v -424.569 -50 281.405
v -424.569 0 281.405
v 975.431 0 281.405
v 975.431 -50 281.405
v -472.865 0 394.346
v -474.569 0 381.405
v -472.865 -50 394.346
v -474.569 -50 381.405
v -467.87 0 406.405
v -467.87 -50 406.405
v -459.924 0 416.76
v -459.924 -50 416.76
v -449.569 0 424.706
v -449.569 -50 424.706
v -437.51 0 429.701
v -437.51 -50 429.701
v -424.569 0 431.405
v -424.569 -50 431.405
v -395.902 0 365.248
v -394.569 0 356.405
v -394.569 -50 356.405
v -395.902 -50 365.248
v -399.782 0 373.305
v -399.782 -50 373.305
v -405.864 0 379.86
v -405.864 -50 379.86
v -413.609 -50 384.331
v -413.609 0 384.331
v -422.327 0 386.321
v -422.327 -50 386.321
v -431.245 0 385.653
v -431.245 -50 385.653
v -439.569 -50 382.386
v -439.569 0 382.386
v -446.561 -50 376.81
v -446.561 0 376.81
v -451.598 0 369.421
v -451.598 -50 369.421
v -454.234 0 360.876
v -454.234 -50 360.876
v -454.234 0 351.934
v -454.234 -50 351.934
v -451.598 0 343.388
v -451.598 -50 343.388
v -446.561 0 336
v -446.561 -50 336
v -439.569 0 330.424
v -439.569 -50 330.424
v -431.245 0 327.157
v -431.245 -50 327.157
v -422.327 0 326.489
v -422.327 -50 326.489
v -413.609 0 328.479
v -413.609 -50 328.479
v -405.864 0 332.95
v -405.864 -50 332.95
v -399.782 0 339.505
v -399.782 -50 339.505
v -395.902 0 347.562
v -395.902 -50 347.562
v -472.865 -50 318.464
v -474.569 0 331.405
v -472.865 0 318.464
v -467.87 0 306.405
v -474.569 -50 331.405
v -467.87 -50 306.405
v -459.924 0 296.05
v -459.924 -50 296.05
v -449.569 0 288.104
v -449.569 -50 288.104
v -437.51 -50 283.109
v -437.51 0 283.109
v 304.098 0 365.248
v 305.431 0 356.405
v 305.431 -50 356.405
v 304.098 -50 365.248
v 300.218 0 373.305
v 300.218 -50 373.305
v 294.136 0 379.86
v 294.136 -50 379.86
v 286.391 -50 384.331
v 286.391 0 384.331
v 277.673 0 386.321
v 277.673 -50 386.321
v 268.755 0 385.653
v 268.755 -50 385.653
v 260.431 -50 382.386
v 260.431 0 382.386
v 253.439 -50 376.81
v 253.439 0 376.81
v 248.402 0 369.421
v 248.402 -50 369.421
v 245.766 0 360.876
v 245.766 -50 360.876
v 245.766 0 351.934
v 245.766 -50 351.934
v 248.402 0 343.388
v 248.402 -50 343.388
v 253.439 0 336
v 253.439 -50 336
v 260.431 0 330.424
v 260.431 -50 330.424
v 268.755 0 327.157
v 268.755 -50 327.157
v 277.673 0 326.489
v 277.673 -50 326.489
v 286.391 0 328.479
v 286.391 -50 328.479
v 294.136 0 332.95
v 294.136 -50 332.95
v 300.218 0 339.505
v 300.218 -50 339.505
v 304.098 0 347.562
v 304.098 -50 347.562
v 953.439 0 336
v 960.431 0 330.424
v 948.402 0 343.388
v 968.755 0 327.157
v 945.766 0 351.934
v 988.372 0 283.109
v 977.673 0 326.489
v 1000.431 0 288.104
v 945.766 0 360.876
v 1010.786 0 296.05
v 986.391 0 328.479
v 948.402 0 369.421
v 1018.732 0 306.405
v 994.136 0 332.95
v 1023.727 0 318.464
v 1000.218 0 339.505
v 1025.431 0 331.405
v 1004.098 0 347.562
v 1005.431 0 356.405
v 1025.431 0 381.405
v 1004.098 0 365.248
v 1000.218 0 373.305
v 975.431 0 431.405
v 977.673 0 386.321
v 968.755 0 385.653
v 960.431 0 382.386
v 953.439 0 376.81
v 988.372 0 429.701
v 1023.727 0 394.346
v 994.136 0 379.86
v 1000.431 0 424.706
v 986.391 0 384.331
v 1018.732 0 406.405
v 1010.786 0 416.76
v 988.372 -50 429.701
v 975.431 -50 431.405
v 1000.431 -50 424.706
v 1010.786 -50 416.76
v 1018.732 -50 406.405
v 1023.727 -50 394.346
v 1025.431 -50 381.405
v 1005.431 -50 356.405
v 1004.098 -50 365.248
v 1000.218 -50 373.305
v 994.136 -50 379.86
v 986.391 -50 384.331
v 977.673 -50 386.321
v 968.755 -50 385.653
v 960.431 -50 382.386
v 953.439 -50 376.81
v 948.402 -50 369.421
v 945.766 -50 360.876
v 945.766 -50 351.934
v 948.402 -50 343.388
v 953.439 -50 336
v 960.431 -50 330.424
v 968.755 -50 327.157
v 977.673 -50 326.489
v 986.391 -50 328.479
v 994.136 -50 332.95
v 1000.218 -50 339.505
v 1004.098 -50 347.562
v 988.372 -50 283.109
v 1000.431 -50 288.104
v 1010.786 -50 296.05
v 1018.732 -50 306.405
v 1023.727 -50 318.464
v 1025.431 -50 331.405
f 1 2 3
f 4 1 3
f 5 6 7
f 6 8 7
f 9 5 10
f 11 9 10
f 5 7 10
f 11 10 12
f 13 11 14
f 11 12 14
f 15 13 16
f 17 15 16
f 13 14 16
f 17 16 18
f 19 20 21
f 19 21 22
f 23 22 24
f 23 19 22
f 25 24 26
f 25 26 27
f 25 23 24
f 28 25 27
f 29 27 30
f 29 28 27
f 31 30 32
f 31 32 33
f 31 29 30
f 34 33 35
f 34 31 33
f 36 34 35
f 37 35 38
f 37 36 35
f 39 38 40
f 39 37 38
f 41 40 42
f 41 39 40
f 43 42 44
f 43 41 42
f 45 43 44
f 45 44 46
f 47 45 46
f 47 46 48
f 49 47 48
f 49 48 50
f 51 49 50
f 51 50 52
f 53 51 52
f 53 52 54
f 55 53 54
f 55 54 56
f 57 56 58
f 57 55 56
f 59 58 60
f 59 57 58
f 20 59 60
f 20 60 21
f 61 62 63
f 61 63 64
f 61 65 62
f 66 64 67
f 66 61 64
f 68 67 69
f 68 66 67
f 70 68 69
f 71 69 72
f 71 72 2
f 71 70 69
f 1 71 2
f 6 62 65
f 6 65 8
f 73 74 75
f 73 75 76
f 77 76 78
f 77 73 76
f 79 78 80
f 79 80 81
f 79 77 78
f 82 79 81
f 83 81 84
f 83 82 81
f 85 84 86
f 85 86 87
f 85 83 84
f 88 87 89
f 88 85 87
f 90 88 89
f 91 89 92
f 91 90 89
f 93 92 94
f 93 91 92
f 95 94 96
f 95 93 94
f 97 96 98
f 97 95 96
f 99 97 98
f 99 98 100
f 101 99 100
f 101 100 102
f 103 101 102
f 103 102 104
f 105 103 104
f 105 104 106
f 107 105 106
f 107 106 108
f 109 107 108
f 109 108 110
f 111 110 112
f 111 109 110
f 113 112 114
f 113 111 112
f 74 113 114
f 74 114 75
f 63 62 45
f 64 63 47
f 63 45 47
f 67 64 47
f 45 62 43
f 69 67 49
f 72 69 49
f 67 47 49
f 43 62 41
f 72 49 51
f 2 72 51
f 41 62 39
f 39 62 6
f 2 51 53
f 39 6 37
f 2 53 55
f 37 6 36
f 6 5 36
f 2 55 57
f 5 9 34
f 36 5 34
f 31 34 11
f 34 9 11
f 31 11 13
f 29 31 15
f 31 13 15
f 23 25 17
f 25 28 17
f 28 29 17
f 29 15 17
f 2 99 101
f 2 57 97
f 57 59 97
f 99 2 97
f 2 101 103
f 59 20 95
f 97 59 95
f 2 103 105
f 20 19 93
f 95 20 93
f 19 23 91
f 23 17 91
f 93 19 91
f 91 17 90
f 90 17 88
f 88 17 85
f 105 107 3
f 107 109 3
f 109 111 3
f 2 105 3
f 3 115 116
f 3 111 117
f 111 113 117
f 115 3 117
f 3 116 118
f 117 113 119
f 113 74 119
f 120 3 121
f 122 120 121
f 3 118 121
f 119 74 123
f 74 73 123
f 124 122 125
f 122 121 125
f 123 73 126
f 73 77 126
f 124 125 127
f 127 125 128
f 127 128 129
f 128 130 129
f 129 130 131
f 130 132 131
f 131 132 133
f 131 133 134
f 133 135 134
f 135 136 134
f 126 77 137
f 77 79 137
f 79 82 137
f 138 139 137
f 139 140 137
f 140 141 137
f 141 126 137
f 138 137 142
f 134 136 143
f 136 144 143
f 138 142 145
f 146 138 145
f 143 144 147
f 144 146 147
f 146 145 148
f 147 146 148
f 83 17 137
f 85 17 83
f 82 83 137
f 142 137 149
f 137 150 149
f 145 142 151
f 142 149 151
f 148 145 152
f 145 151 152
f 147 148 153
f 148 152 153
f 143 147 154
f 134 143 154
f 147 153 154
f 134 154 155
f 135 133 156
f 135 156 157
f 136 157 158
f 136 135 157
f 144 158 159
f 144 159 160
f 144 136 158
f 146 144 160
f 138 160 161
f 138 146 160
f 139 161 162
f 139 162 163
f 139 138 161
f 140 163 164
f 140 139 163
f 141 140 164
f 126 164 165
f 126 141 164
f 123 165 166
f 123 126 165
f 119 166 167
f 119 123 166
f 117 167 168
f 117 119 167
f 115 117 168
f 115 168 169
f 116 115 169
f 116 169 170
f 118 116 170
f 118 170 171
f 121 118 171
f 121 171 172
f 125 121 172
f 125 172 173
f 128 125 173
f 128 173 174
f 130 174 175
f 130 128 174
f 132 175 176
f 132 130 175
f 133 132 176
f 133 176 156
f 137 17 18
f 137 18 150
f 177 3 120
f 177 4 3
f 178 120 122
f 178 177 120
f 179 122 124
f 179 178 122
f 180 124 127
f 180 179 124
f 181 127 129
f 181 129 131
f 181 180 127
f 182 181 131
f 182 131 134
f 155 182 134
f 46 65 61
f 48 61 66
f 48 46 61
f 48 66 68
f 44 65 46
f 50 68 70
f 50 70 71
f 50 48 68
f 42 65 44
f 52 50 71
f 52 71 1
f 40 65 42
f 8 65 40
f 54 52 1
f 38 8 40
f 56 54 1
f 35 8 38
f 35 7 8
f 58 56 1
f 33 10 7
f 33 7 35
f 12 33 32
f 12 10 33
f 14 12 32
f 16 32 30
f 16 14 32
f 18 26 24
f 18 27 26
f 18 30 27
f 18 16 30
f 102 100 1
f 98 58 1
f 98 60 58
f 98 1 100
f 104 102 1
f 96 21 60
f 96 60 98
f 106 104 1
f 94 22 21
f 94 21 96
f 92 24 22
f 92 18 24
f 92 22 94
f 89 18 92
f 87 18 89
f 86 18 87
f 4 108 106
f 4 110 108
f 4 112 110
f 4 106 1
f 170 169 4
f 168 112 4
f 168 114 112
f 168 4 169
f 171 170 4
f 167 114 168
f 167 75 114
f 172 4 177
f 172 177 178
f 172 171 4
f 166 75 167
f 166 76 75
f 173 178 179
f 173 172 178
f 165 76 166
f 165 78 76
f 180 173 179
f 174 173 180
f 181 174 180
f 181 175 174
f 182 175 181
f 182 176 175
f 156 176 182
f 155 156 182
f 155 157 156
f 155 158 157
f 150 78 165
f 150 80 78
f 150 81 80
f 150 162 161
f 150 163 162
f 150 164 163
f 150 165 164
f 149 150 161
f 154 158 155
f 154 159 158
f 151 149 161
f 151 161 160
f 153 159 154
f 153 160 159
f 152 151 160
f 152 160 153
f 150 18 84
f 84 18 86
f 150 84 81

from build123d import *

# Parameters (mm, degrees)
F0_W     = 1500
F0_H     = 150
F0_R     = 30
F1_DEPTH = 50
F2_R     = 50


with BuildPart() as f1:
    # F0 (on Front) → F1 (new body)
    with BuildSketch(Plane.XZ):
        with Locations((275.430977, 356.40495)):
            Rectangle(F0_W, F0_H)
        with Locations((-424.569023, 356.40495)):
            Circle(F0_R, mode=Mode.SUBTRACT)
        with Locations((275.430977, 356.40495)):
            Circle(F0_R, mode=Mode.SUBTRACT)
        with Locations((975.430977, 356.40495)):
            Circle(F0_R, mode=Mode.SUBTRACT)
    extrude(amount=F1_DEPTH)

    # F2
    f2_edges = [f1.edges().sort_by_distance(p)[0] for p in [
        (-474.569023, -25, 431.40495),
        (-474.569023, -25, 281.40495),
        (1025.430977, -25, 431.40495),
        (1025.430977, -25, 281.40495),
    ]]
    fillet(f2_edges, radius=F2_R)


solid = f1.part
